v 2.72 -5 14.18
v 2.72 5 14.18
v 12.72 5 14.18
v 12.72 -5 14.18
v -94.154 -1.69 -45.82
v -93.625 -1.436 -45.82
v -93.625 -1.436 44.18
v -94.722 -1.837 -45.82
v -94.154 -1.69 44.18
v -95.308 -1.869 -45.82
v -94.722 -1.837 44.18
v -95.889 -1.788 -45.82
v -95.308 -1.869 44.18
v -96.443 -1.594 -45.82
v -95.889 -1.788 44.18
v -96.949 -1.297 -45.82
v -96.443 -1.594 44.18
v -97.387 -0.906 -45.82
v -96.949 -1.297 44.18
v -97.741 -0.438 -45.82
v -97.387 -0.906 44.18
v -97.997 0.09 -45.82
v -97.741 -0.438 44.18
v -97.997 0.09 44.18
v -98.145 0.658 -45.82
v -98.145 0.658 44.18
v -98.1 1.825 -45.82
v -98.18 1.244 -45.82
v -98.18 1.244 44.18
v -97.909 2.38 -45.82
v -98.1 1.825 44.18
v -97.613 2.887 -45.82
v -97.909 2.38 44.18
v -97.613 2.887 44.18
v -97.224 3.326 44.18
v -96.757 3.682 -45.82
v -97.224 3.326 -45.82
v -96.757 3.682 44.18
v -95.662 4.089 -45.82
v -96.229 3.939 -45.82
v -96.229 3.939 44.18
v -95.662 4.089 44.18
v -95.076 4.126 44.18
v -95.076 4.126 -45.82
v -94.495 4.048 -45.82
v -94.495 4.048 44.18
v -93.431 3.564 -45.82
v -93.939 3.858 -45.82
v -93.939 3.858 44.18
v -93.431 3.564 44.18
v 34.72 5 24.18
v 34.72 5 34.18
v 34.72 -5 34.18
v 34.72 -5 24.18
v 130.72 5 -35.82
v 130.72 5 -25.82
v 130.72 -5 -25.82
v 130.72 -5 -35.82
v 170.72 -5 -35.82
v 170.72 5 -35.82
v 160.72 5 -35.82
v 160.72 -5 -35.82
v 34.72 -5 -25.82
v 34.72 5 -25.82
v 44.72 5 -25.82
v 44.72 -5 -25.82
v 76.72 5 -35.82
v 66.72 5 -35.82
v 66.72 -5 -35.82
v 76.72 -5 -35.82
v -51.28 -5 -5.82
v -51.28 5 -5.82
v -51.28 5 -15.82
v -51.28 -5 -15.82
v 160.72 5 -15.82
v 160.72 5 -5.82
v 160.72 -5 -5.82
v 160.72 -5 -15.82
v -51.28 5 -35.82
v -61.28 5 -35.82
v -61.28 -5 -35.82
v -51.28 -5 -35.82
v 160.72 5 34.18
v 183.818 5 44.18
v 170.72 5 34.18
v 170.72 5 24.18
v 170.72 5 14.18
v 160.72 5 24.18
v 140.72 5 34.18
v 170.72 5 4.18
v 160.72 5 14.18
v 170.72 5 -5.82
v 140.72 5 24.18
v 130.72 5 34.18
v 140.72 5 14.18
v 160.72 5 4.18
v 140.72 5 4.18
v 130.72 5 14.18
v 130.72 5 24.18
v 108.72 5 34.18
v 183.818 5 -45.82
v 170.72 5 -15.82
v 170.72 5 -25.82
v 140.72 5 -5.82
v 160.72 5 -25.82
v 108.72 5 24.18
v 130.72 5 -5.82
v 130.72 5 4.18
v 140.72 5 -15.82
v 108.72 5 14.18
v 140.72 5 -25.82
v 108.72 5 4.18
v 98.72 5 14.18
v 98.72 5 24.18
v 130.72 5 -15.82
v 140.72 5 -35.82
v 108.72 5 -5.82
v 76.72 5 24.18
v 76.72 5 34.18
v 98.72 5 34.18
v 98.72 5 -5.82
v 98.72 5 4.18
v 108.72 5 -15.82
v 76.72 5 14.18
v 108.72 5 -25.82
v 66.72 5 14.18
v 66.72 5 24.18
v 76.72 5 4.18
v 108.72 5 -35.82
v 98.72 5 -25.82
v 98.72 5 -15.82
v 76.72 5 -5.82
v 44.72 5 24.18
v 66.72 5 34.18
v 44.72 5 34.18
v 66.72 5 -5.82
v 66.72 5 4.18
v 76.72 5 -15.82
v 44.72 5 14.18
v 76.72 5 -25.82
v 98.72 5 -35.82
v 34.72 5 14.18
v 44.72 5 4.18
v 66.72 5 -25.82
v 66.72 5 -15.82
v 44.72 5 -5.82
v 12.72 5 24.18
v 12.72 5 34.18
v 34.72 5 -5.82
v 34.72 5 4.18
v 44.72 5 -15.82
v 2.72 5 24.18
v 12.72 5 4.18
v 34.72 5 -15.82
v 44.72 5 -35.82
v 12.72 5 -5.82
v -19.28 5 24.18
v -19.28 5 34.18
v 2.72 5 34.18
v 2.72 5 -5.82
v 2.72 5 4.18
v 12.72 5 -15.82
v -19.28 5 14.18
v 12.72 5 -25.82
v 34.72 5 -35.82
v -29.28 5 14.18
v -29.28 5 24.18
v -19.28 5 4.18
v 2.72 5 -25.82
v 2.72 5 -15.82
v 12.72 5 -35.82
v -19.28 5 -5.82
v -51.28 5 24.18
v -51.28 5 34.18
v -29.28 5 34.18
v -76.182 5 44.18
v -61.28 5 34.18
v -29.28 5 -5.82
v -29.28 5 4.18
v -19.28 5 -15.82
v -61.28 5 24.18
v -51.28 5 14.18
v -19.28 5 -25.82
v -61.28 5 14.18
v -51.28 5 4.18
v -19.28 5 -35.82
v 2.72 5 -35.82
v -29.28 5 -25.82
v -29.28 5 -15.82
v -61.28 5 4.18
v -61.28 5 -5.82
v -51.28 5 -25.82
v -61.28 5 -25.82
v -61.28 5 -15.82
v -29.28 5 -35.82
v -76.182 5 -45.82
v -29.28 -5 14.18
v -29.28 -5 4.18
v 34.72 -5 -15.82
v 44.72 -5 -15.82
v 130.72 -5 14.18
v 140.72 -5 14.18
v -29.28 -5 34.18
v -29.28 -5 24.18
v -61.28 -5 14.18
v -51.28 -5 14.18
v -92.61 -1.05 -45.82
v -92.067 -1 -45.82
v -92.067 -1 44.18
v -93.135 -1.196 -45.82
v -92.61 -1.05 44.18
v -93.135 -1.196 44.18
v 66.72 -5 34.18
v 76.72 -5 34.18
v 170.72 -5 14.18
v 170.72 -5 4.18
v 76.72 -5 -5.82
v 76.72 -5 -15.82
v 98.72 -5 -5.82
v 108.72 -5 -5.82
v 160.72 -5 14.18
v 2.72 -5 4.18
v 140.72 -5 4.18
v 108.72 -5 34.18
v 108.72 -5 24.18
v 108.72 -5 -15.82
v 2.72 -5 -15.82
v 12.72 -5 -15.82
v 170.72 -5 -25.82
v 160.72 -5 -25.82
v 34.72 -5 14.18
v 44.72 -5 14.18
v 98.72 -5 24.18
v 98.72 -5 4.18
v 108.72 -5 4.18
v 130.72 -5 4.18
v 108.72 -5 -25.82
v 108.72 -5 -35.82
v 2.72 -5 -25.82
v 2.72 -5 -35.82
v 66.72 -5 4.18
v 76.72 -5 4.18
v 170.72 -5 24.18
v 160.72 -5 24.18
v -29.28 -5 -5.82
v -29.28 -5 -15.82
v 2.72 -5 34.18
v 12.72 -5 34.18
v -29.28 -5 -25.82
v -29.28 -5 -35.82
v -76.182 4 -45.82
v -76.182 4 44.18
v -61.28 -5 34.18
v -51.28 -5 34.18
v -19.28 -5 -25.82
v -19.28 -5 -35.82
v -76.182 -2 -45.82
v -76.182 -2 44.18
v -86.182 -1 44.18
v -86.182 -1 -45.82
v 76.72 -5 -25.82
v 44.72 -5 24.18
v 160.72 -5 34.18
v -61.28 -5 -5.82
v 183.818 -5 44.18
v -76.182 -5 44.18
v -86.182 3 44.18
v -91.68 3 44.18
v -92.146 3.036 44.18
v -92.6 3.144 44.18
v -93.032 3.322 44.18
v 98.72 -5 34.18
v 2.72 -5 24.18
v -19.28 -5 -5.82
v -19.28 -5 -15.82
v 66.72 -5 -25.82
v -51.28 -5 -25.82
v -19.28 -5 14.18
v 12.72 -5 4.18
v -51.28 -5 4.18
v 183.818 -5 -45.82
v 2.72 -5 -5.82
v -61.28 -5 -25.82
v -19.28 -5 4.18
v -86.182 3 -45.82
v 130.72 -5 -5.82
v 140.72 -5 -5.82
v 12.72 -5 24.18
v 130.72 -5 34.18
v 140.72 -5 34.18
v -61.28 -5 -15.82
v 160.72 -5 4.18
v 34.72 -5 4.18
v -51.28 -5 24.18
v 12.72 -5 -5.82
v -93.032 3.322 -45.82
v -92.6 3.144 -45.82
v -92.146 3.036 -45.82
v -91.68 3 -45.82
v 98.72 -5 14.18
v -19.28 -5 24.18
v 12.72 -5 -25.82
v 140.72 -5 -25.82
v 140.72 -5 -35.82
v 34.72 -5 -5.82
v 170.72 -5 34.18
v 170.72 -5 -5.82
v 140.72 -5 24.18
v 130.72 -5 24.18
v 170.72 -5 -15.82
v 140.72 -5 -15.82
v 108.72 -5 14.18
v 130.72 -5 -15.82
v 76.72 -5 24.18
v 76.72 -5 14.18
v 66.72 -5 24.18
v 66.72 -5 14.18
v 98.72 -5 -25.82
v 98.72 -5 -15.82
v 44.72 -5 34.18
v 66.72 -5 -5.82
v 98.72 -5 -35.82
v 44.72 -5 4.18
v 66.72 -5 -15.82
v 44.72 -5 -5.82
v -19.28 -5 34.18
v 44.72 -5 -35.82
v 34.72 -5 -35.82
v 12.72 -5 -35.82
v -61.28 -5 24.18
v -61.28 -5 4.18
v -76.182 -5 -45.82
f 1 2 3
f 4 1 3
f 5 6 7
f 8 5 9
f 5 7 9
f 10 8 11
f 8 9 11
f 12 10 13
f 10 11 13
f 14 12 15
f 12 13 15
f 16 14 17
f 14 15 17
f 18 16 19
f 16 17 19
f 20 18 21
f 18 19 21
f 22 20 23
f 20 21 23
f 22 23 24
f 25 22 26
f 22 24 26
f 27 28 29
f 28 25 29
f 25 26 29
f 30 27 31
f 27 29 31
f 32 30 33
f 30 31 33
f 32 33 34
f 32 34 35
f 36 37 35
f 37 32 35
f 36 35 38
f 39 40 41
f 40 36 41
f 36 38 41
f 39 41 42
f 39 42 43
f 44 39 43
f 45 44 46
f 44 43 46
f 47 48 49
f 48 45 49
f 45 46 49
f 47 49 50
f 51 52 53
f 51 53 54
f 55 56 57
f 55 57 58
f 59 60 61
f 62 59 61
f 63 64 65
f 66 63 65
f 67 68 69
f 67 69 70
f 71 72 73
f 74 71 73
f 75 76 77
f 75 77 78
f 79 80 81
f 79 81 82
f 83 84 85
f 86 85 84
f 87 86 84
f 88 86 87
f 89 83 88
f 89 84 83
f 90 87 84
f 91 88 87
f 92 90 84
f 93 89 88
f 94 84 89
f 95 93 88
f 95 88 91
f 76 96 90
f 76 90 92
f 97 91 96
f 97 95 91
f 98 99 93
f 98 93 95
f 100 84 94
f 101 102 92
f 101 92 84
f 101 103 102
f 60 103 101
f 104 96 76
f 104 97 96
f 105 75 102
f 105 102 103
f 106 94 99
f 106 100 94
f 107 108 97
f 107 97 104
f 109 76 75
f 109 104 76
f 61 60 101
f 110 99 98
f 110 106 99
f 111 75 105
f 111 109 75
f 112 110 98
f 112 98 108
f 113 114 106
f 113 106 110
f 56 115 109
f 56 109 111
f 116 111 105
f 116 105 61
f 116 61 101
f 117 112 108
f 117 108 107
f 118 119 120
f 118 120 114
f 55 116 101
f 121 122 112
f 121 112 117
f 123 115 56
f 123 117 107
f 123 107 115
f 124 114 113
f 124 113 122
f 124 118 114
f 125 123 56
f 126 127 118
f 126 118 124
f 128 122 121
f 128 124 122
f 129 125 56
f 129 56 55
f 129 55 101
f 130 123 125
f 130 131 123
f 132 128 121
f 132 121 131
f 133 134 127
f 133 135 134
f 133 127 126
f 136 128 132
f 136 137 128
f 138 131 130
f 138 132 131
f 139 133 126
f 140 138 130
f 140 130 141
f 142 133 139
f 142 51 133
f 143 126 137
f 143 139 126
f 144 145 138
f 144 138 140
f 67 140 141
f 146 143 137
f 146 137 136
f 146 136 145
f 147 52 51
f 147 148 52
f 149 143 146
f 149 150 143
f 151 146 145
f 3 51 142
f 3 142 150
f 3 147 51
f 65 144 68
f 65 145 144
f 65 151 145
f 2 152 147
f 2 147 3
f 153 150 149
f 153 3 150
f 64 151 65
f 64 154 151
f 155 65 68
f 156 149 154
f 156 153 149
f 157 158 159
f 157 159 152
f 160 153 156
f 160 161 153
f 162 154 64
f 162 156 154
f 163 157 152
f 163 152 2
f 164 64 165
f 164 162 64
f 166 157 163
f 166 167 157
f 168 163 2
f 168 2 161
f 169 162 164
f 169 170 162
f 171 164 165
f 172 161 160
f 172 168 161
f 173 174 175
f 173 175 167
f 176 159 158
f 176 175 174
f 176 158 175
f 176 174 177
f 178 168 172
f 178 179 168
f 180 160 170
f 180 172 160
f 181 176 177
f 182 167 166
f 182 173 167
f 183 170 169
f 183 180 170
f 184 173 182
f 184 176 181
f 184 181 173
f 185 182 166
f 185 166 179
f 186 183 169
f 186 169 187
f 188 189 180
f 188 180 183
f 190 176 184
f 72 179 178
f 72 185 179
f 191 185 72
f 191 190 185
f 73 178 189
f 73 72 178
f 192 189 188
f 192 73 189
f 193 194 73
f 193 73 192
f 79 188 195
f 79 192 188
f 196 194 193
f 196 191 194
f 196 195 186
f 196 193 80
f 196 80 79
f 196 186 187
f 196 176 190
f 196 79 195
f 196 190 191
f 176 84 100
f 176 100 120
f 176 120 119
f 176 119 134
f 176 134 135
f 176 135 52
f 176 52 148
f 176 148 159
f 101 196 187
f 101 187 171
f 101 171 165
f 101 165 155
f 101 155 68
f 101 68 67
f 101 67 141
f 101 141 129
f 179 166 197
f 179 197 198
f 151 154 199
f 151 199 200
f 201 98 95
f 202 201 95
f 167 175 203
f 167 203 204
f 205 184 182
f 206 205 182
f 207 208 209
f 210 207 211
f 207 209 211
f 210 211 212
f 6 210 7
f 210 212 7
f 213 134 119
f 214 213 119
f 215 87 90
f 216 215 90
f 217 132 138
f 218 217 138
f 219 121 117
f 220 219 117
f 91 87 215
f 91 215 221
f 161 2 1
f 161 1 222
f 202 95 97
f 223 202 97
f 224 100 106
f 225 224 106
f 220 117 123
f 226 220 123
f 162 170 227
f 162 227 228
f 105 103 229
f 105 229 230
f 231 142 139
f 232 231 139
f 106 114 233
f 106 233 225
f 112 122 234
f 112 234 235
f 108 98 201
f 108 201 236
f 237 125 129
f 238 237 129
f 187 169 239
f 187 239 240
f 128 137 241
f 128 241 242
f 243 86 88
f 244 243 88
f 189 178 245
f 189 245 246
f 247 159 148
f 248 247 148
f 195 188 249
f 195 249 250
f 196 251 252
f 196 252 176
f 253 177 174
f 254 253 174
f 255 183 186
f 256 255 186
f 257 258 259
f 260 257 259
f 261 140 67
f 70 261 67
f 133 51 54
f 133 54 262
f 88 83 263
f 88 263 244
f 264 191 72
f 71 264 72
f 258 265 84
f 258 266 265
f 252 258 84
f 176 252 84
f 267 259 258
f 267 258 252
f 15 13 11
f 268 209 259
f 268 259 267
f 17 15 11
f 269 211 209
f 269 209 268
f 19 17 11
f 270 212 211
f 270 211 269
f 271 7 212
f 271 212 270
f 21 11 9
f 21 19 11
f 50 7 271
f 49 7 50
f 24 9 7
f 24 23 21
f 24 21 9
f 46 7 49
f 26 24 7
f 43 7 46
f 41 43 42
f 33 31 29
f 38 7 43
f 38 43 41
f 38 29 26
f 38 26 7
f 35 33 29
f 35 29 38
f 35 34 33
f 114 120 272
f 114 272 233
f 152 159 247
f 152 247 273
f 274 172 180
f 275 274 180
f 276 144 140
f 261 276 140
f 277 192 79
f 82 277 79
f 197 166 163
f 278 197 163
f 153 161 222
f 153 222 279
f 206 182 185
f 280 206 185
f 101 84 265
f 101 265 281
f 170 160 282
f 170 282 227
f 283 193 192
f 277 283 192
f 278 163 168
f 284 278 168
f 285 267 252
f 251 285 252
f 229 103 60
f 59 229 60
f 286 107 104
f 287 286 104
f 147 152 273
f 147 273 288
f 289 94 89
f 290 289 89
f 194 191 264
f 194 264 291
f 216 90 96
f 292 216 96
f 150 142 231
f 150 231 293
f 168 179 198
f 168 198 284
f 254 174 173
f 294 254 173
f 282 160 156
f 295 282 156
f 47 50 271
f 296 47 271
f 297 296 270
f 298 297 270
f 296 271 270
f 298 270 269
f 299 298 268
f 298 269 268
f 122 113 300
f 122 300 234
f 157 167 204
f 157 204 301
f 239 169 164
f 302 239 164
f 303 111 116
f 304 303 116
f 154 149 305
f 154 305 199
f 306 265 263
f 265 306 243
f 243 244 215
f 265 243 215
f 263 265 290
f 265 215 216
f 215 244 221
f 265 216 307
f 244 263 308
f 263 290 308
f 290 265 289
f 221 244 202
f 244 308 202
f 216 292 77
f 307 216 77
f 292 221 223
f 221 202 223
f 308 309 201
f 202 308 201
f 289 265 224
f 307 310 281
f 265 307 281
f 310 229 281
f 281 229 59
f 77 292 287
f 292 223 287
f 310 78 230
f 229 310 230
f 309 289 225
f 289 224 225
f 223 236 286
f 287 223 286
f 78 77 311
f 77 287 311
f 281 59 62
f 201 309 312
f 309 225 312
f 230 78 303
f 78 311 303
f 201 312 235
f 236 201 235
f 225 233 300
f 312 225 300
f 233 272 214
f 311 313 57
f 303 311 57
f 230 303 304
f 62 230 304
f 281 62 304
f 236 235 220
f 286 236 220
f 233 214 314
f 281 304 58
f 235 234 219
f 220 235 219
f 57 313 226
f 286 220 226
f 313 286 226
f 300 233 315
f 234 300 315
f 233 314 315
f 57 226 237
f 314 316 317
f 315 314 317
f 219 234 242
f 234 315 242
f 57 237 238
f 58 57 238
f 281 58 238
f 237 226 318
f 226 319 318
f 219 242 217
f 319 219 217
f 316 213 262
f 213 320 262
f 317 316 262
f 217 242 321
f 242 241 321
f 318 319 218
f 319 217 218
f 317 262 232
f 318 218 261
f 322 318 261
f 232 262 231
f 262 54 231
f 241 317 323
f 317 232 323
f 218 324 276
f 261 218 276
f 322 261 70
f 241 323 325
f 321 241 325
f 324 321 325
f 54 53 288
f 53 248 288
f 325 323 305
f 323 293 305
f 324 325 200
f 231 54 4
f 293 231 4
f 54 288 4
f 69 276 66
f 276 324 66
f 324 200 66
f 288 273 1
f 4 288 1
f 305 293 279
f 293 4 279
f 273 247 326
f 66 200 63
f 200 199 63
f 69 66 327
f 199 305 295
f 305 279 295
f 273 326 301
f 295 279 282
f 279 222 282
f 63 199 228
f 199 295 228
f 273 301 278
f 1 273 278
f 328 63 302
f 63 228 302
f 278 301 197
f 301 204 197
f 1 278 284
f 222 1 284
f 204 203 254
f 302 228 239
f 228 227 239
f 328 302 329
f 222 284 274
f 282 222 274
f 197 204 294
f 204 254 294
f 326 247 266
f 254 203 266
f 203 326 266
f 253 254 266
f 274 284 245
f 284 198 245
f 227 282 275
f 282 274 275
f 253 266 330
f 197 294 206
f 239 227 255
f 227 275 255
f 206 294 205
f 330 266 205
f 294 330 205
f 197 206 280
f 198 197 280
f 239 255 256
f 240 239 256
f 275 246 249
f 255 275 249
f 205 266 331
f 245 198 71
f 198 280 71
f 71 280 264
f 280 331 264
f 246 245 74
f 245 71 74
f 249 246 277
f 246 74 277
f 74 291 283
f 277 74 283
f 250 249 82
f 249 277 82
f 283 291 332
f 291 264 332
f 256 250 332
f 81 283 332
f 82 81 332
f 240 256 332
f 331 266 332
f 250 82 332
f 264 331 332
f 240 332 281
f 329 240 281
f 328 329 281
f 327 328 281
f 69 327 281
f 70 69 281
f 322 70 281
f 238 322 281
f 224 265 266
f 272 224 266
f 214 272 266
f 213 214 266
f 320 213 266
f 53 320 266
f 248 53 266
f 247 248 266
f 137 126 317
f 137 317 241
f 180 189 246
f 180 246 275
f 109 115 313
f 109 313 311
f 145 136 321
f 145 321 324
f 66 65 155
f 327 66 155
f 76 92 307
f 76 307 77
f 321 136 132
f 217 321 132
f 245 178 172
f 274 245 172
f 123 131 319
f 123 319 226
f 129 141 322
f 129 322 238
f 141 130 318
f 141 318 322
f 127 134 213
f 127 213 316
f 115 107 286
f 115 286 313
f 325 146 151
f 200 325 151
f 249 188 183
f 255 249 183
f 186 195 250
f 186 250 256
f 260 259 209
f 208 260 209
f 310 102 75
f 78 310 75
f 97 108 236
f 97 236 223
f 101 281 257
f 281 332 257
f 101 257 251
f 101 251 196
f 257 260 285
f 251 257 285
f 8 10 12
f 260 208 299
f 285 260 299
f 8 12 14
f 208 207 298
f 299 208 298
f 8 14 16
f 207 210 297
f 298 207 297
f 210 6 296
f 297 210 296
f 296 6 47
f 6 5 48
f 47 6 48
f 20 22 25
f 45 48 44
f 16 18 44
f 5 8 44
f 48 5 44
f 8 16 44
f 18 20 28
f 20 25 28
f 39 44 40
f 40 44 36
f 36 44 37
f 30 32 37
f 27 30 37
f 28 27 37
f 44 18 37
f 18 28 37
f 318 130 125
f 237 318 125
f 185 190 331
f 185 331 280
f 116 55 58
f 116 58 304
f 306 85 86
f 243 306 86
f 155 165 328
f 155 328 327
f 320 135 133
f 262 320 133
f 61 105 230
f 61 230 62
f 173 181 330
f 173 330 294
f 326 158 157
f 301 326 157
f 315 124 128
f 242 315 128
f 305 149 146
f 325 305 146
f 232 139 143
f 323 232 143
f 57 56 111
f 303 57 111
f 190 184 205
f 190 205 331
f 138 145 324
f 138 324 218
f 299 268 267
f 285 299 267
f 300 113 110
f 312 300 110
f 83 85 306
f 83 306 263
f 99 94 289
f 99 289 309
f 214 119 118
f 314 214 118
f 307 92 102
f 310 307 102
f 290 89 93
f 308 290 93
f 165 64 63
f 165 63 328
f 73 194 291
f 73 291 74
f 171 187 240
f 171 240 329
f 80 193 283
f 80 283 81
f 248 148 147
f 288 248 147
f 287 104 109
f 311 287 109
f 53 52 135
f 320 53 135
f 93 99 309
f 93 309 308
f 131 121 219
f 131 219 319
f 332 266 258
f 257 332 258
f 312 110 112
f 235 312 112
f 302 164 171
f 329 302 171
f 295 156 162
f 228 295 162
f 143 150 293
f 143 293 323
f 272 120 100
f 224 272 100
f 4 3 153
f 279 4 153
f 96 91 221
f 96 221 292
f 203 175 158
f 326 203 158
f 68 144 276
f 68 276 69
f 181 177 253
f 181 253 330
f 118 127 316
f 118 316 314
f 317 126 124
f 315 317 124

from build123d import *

# Parameters (mm, degrees)
SKETCH1_W           = 215
SKETCH1_H           = 90
BOSS_EXTRUDE1_DEPTH = 5
CUT_EXTRUDE2_DEPTH  = 146.187632354
SKETCH7_W           = 90
SKETCH7_H           = 10
BOSS_EXTRUDE3_DEPTH = 70
SKETCH8_W           = 10
SKETCH8_H           = 10
CUT_EXTRUDE4_DEPTH  = 38


with BuildPart() as part:
    # Sketch1 → Boss-Extrude1 (new, symmetric)
    with BuildSketch(Plane(origin=(0, 0, 0), x_dir=(1, 0, 0), z_dir=(0, 1, 0))):
        with Locations((6.317611065, 0.819935691)):
            Rectangle(SKETCH1_W, SKETCH1_H)
    extrude(amount=BOSS_EXTRUDE1_DEPTH, both=True)

    # Sketch3 → Cut-Extrude2 (cut, through all)
    with BuildSketch(Plane.XY.offset(44.180064309)):
        with BuildLine():
            Line((-101.182388935, -5), (-76.182388935, -5))
            Line((-76.182388935, -5), (-76.182388935, -2))
            Line((-76.182388935, -2), (-86.182388935, -1))
            Line((-86.182388935, -1), (-92.067313838, -1))
            ThreePointArc((-92.067313838, -1), (-92.876019978, -1.111056529), (-93.624851386, -1.436003747))
            ThreePointArc((-93.624851386, -1.436003747), (-98.180146552, 1.243963481), (-93.431421846, 3.563996253))
            ThreePointArc((-93.431421846, 3.563996253), (-92.600234286, 3.144478048), (-91.680454758, 3))
            Line((-91.680454758, 3), (-86.182388935, 3))
            Line((-86.182388935, 3), (-76.182388935, 4))
            Line((-76.182388935, 4), (-76.182388935, 5))
            Line((-76.182388935, 5), (-101.182388935, 5))
            Line((-101.182388935, 5), (-101.182388935, -5))
        make_face()
    extrude(amount=-CUT_EXTRUDE2_DEPTH, mode=Mode.SUBTRACT)

    # Sketch7 → Boss-Extrude3 (add)
    with BuildSketch(Plane(origin=(113.817611065, 0, 0), x_dir=(0, 0, -1), z_dir=(1, 0, 0))):
        with Locations((0.819935691, 0)):
            Rectangle(SKETCH7_W, SKETCH7_H)
    extrude(amount=BOSS_EXTRUDE3_DEPTH)

    # Sketch8 → Cut-Extrude4 (cut)
    with BuildSketch(Plane(origin=(0, 5, 0), x_dir=(1, 0, 0), z_dir=(0, 1, 0))):
        with Locations((-24.27998453, -29.180064309)):
            Rectangle(SKETCH8_W, SKETCH8_H)
        with Locations((-56.27998453, -29.180064309)):
            Rectangle(SKETCH8_W, SKETCH8_H)
        with Locations((7.72001547, -29.180064309)):
            Rectangle(SKETCH8_W, SKETCH8_H)
        with Locations((39.72001547, -29.180064309)):
            Rectangle(SKETCH8_W, SKETCH8_H)
        with Locations((71.72001547, -29.180064309)):
            Rectangle(SKETCH8_W, SKETCH8_H)
        with Locations((103.72001547, -29.180064309)):
            Rectangle(SKETCH8_W, SKETCH8_H)
        with Locations((135.72001547, -29.180064309)):
            Rectangle(SKETCH8_W, SKETCH8_H)
        with Locations((-24.27998453, -9.180064309)):
            Rectangle(SKETCH8_W, SKETCH8_H)
        with Locations((7.72001547, -9.180064309)):
            Rectangle(SKETCH8_W, SKETCH8_H)
        with Locations((39.72001547, -9.180064309)):
            Rectangle(SKETCH8_W, SKETCH8_H)
        with Locations((71.72001547, -9.180064309)):
            Rectangle(SKETCH8_W, SKETCH8_H)
        with Locations((103.72001547, -9.180064309)):
            Rectangle(SKETCH8_W, SKETCH8_H)
        with Locations((135.72001547, -9.180064309)):
            Rectangle(SKETCH8_W, SKETCH8_H)
        with Locations((-24.27998453, 10.819935691)):
            Rectangle(SKETCH8_W, SKETCH8_H)
        with Locations((7.72001547, 10.819935691)):
            Rectangle(SKETCH8_W, SKETCH8_H)
        with Locations((39.72001547, 10.819935691)):
            Rectangle(SKETCH8_W, SKETCH8_H)
        with Locations((71.72001547, 10.819935691)):
            Rectangle(SKETCH8_W, SKETCH8_H)
        with Locations((103.72001547, 10.819935691)):
            Rectangle(SKETCH8_W, SKETCH8_H)
        with Locations((135.72001547, 10.819935691)):
            Rectangle(SKETCH8_W, SKETCH8_H)
        with Locations((-24.27998453, 30.819935691)):
            Rectangle(SKETCH8_W, SKETCH8_H)
        with Locations((7.72001547, 30.819935691)):
            Rectangle(SKETCH8_W, SKETCH8_H)
        with Locations((39.72001547, 30.819935691)):
            Rectangle(SKETCH8_W, SKETCH8_H)
        with Locations((71.72001547, 30.819935691)):
            Rectangle(SKETCH8_W, SKETCH8_H)
        with Locations((103.72001547, 30.819935691)):
            Rectangle(SKETCH8_W, SKETCH8_H)
        with Locations((135.72001547, 30.819935691)):
            Rectangle(SKETCH8_W, SKETCH8_H)
        with Locations((-56.27998453, -9.180064309)):
            Rectangle(SKETCH8_W, SKETCH8_H)
        with Locations((-56.27998453, 10.819935691)):
            Rectangle(SKETCH8_W, SKETCH8_H)
        with Locations((-56.27998453, 30.819935691)):
            Rectangle(SKETCH8_W, SKETCH8_H)
    cut_extrude4 = extrude(amount=-CUT_EXTRUDE4_DEPTH, mode=Mode.SUBTRACT)

    # Mirror2: Cut-Extrude4 across plane
    add(cut_extrude4.mirror(Plane.ZY.offset(-150.72001547)), mode=Mode.SUBTRACT)


solid = part.part
